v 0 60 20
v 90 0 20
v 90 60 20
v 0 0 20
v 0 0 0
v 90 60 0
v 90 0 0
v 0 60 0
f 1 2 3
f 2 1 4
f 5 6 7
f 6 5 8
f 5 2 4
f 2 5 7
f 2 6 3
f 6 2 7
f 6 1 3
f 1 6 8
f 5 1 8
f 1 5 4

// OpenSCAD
/**
 * rpi2B.scad - a block dimensioned as placeholder for
 * Raspberry Pi 2 Model B, 90mm x 60mm x 20mm
 *
 * @author R. S. Doiel, <rsdoiel@gmail.com>
 * copyright (c) 2016 all rights reserved
 * Released under a BSD 2-clause license
 */

module rpi2B() {
    color([0.5,1,0.5]) cube([90,60,20]);
}

rpi2B();
